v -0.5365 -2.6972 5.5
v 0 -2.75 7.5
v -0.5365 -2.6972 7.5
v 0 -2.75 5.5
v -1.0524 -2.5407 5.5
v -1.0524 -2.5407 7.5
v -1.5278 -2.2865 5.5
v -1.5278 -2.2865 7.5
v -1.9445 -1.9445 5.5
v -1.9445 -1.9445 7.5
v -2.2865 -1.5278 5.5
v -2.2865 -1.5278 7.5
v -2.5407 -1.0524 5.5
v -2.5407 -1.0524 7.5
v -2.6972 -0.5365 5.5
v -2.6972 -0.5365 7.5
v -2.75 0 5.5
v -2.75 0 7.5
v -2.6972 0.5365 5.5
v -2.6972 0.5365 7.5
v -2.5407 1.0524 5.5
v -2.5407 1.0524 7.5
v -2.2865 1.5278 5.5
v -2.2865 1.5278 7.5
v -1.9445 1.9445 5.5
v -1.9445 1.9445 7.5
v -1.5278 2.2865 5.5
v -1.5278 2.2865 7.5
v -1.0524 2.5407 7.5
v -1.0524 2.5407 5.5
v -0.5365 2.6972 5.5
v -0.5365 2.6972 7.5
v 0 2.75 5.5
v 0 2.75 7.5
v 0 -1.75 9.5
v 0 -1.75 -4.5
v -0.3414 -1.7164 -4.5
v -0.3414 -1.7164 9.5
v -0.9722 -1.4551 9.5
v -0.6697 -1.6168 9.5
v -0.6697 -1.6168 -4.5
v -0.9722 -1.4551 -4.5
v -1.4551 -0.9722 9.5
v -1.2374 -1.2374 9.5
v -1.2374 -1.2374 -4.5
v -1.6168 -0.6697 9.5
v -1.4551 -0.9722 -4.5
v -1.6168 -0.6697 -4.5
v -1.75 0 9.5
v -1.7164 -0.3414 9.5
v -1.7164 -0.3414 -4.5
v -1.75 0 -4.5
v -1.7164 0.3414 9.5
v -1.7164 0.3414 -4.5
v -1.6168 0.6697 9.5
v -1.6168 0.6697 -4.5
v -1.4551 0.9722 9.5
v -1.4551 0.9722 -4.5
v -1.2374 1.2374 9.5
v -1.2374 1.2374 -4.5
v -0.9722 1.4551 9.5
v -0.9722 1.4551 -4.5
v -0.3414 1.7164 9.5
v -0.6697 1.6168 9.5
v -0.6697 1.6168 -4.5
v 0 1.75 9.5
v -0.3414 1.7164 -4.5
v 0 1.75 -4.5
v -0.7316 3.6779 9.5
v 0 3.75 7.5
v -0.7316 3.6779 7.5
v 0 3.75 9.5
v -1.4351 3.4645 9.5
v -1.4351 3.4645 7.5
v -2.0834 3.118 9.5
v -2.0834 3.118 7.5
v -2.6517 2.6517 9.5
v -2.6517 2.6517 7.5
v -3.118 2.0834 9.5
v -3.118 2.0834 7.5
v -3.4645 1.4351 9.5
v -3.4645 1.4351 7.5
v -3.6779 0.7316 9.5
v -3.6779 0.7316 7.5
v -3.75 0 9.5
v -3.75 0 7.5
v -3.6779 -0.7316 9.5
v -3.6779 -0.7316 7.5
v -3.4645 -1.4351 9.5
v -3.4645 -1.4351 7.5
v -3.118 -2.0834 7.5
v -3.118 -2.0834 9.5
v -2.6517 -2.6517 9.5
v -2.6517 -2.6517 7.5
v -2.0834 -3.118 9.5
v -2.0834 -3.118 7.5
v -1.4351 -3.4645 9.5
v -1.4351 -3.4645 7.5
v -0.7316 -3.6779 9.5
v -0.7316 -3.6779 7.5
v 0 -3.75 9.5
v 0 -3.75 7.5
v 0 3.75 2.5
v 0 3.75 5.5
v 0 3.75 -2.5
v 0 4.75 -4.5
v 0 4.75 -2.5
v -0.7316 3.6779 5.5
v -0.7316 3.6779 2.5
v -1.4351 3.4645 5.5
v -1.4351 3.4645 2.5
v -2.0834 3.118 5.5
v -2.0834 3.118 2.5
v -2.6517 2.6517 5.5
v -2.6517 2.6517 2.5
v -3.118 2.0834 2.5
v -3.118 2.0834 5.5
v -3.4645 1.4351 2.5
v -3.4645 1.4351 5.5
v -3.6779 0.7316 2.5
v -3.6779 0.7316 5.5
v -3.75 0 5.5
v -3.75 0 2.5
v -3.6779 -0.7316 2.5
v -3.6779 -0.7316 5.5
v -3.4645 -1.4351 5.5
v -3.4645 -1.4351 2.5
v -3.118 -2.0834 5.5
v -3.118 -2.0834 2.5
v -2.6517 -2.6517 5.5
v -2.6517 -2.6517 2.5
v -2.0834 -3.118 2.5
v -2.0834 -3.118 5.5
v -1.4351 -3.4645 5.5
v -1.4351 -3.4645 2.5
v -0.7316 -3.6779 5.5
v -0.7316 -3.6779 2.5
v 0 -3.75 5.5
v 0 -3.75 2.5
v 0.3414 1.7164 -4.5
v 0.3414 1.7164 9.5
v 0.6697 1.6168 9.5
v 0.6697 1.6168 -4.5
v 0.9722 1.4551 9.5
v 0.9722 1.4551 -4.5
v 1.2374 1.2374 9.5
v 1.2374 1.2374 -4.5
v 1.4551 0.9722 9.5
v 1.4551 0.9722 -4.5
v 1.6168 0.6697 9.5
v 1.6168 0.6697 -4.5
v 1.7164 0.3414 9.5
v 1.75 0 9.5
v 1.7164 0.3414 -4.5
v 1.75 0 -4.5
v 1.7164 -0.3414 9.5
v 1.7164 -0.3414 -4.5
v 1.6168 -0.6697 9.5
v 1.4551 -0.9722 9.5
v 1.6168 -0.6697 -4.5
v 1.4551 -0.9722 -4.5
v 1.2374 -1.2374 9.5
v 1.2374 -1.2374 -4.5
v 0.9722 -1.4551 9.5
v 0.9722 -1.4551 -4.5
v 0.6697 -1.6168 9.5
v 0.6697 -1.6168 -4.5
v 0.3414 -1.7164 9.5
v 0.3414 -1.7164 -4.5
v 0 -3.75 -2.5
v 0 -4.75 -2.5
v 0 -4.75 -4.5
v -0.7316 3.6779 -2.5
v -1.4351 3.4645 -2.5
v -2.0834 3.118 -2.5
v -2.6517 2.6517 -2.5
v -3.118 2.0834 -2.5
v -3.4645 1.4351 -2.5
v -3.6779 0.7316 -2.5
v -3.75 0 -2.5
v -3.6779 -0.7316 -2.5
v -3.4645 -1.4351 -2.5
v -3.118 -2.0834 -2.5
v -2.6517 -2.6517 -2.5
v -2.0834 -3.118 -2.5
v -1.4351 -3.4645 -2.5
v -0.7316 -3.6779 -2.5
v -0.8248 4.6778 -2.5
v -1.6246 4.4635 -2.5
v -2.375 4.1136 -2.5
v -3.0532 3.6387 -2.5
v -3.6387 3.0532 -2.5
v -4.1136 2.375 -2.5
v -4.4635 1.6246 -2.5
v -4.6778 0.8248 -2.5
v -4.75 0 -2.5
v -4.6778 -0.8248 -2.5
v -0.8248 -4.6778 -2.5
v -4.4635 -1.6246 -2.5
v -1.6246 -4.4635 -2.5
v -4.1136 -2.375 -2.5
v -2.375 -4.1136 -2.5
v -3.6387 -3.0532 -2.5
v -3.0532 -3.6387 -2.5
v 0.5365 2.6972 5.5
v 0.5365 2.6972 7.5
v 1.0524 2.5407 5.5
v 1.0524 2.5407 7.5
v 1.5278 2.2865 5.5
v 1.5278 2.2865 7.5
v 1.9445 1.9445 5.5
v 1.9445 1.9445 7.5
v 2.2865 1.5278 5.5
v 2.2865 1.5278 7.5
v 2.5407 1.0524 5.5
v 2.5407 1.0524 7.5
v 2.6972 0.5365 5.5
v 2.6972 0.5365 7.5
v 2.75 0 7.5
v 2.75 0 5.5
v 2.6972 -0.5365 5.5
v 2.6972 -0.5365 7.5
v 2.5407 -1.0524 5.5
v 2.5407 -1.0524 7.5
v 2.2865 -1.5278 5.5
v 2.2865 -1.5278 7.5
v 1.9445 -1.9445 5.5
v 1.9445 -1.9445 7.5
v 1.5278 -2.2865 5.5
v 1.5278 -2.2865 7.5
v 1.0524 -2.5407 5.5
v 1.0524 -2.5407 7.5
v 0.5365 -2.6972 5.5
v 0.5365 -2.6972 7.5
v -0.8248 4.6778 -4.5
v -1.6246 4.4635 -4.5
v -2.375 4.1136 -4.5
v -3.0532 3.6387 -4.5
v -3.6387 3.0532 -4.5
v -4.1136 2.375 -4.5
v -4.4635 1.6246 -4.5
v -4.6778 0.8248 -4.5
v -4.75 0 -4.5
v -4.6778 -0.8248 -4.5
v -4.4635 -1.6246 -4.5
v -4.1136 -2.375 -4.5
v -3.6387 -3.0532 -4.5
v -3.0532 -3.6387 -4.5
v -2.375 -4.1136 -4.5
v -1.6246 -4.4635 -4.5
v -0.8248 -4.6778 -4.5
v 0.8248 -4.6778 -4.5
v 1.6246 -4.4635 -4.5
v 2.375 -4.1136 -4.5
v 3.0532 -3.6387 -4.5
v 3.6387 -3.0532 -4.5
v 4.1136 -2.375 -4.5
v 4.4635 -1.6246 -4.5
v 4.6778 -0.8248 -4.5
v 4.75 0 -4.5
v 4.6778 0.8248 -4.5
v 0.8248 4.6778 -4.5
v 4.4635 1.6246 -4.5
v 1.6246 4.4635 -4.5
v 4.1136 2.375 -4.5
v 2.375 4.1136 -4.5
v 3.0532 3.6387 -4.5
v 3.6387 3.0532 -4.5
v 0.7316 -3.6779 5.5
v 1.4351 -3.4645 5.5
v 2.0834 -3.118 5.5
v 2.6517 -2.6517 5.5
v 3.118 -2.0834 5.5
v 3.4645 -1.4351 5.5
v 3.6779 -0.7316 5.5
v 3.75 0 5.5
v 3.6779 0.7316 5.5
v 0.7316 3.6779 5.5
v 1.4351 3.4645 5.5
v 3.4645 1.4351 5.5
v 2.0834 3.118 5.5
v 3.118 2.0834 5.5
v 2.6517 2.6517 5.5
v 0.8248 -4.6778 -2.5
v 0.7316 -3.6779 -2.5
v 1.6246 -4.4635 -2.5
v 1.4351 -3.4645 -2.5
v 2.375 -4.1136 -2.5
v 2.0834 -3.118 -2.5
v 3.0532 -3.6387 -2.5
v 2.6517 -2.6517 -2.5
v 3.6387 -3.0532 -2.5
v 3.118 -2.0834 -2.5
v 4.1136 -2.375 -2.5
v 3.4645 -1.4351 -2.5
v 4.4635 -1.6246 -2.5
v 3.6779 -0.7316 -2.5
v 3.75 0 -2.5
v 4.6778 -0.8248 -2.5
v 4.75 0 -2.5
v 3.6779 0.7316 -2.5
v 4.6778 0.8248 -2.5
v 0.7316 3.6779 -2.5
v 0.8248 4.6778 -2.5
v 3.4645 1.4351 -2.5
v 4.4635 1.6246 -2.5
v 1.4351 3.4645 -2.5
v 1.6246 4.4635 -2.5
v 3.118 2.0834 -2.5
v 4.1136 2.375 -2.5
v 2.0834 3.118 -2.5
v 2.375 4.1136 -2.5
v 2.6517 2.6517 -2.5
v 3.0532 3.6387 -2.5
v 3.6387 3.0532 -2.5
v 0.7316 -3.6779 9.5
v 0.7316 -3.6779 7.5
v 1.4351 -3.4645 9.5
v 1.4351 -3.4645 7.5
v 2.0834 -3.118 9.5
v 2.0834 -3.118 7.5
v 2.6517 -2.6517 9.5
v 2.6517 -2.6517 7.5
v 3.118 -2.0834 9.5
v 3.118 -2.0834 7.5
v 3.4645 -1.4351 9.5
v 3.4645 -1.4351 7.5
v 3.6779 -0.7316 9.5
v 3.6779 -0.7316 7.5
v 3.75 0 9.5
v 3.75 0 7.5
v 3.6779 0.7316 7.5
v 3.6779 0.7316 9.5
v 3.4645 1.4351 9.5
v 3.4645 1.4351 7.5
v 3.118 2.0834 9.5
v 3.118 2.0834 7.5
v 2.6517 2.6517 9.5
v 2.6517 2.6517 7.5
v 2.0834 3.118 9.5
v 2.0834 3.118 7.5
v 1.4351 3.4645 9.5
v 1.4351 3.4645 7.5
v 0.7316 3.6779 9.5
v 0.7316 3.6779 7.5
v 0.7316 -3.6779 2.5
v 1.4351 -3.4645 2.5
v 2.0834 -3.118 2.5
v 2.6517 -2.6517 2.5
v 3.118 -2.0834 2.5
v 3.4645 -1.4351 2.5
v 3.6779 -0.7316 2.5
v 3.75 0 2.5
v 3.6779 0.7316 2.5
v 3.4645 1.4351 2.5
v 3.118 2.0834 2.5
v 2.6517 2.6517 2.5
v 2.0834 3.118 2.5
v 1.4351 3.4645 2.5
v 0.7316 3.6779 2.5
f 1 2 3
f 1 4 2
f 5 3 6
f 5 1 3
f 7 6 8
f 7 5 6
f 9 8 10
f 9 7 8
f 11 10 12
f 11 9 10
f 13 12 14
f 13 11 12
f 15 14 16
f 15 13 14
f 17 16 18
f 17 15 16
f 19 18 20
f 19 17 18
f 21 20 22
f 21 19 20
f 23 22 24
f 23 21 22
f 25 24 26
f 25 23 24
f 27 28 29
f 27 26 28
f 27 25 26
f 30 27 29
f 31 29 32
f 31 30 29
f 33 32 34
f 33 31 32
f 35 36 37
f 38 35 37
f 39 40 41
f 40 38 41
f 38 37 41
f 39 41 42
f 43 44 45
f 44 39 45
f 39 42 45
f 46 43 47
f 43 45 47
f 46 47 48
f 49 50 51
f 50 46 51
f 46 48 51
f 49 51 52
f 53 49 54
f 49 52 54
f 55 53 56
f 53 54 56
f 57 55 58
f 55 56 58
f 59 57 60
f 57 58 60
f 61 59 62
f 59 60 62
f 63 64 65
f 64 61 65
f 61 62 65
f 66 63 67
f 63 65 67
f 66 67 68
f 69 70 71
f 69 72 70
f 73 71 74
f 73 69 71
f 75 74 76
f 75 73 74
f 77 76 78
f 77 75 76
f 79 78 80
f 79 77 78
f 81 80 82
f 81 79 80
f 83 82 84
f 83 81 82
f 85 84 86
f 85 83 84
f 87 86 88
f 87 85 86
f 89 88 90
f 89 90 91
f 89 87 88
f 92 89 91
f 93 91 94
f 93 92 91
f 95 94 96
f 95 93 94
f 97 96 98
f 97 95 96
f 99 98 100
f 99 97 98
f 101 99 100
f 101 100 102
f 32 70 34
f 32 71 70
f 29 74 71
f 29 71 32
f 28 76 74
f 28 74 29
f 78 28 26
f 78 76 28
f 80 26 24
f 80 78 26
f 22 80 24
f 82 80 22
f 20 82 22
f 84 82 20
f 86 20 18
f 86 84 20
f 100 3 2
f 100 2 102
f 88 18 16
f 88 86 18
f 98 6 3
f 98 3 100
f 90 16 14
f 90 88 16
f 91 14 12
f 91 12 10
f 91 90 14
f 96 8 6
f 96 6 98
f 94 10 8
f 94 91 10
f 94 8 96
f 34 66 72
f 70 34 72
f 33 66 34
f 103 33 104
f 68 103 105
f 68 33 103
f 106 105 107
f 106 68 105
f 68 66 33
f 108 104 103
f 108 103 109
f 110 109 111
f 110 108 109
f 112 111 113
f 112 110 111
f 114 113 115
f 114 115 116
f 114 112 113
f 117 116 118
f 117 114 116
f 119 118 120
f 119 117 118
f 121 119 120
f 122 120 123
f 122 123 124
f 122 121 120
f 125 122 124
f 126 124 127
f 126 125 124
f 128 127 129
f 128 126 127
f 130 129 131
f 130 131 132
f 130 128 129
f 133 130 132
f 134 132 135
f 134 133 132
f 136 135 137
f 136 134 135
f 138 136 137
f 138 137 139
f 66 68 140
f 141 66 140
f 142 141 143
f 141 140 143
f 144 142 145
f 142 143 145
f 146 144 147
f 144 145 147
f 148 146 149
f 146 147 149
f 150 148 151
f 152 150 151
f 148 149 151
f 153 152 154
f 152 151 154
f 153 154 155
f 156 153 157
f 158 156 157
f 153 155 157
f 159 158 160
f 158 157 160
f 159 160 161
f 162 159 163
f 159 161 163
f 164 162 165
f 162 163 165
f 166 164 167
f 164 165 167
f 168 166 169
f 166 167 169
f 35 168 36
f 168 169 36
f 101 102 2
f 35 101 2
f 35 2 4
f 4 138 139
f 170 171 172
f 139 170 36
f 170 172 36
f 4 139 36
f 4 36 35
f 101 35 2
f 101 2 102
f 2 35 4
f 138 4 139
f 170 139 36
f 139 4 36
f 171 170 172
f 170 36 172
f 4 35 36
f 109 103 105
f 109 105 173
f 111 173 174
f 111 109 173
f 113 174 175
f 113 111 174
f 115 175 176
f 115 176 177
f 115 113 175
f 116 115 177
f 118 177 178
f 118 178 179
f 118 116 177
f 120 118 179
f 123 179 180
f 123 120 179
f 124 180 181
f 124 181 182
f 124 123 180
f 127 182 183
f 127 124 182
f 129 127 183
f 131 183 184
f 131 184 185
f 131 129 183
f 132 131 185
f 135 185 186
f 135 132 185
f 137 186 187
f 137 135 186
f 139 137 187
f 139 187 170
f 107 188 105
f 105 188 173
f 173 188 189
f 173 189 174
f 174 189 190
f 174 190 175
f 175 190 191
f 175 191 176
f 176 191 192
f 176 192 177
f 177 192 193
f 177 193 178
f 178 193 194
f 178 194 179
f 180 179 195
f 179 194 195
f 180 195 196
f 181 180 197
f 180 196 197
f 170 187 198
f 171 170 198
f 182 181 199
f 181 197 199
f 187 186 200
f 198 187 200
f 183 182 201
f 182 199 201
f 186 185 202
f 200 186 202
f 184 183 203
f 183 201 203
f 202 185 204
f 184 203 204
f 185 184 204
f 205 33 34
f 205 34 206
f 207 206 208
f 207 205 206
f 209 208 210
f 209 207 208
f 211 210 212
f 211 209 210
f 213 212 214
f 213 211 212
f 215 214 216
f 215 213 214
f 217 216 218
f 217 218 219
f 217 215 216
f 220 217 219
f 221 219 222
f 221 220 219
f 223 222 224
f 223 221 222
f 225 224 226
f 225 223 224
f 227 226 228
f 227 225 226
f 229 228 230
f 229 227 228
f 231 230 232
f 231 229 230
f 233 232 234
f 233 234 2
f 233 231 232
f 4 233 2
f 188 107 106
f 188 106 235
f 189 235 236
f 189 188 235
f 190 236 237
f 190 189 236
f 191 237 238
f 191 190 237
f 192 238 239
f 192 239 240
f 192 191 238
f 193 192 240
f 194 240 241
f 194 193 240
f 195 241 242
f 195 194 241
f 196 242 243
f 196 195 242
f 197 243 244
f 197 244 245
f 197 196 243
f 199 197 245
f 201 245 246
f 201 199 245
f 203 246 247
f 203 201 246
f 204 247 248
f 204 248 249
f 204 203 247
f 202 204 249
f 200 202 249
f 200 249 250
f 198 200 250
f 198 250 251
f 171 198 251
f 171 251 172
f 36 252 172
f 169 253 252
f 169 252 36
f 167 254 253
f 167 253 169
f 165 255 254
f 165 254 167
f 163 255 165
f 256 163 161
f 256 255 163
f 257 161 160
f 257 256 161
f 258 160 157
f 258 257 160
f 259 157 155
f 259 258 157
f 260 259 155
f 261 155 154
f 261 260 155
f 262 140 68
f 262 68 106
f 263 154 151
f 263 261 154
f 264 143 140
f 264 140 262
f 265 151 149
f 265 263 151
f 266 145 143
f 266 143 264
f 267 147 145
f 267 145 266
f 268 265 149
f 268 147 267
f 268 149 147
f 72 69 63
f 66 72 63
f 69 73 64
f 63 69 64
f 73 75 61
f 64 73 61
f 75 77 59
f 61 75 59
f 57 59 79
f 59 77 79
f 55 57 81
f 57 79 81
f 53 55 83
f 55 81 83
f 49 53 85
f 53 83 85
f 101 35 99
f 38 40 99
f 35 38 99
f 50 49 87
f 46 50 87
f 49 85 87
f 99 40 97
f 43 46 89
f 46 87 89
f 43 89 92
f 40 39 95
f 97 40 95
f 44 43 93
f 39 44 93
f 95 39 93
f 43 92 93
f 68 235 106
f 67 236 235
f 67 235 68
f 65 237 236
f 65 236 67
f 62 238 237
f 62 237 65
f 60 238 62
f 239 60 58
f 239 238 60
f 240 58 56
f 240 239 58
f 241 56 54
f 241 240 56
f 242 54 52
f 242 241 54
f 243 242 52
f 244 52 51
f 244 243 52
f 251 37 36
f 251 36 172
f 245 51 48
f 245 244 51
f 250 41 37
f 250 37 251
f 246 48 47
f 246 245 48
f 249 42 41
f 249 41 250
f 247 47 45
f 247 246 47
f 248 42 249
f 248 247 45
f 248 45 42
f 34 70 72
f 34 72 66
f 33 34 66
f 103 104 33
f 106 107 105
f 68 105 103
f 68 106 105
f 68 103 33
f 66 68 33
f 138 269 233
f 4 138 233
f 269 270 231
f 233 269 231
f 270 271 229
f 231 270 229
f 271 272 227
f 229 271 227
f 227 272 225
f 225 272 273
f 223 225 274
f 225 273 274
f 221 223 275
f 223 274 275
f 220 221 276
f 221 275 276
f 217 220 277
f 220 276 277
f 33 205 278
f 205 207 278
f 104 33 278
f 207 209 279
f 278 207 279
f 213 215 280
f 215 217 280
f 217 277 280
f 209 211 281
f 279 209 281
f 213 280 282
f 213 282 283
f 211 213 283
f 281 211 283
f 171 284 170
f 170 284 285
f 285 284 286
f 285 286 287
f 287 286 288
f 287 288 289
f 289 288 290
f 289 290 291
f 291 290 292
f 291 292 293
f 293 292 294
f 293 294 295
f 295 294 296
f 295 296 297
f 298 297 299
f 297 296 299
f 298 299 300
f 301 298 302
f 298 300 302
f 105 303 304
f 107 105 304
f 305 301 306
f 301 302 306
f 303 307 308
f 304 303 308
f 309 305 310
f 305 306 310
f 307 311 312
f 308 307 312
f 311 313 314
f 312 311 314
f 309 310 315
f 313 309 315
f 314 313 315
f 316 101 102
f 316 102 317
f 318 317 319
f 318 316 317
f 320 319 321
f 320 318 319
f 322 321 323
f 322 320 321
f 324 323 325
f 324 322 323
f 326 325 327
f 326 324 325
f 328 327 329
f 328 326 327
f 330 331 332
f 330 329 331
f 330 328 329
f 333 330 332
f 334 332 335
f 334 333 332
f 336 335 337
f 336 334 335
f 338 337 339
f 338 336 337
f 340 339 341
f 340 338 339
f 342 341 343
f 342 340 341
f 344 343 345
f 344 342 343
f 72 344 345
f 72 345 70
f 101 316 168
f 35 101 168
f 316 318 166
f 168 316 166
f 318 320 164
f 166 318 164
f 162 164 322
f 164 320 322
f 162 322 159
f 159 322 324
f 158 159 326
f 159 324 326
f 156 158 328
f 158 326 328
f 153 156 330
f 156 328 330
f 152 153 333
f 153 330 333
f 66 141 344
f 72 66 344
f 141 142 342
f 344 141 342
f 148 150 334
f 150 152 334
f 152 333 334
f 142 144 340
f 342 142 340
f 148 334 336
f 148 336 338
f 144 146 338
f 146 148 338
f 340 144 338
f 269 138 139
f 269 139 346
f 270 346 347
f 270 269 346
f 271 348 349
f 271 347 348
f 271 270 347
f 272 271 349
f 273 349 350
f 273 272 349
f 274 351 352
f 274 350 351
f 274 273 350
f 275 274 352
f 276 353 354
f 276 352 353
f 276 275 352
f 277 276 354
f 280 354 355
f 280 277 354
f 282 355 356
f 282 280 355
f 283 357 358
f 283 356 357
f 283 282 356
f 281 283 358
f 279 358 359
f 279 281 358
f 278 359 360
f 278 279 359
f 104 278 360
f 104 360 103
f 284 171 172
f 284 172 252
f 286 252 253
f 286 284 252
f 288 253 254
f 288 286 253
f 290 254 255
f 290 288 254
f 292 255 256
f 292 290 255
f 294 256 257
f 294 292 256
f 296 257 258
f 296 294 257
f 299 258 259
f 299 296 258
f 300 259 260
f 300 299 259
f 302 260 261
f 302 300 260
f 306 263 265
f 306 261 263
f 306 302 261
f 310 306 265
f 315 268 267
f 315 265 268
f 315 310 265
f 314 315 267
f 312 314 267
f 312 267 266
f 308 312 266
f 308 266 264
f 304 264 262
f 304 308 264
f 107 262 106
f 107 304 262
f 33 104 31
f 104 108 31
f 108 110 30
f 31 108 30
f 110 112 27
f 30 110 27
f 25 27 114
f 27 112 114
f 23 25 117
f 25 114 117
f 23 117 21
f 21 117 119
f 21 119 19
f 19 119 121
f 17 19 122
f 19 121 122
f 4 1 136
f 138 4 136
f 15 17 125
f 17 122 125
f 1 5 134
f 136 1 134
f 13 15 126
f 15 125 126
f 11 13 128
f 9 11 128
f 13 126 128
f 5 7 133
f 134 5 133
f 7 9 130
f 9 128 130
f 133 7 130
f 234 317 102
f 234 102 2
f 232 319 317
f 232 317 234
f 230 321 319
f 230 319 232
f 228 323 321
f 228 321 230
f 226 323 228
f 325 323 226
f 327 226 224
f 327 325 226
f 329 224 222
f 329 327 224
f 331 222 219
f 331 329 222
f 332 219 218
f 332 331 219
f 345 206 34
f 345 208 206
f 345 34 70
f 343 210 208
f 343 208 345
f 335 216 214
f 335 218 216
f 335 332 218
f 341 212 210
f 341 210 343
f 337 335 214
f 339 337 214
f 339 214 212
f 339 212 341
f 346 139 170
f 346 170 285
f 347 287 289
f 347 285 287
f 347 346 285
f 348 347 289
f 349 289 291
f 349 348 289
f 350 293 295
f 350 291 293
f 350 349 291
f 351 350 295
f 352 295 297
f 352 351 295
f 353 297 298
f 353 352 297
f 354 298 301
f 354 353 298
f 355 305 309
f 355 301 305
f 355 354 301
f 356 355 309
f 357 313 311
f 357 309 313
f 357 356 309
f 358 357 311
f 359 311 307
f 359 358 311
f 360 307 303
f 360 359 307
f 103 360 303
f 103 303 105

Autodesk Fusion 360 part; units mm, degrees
sketch "Skizze1" plane through (0, 0, 0) normal (0, 1, 0) x (1, 0, 0)
  line L0 (0, -75) -> (0, 75)
  line L1 (3.75, -2.5) -> (-50.75, -2.5) construction
  line L2 (-50.75, -2.5) -> (-50.75, 2.5) construction
  line L3 (-50.75, 2.5) -> (49.25, 2.5) construction
  line L4 (49.25, 2.5) -> (49.25, -2.5) construction
  line L5 (1.75, 4.5) -> (4.75, 4.5)
  line L6 (4.75, 4.5) -> (4.75, 2.5)
  line L7 (3.75, 2.5) -> (3.75, -2.5)
  line L8 (3.75, -5.5) -> (2.75, -5.5)
  line L9 (2.75, -7.5) -> (3.75, -7.5)
  line L10 (3.75, -7.5) -> (3.75, -9.5)
  line L11 (3.75, -9.5) -> (1.75, -9.5)
  line L12 (1.75, -9.5) -> (1.75, 4.5)
  line L13 (49.25, -2.5) -> (3.75, -2.5) construction
  line L14 (3.75, -2.5) -> (3.75, -5.5)
  line L15 (3.75, 2.5) -> (4.75, 2.5)
  line L16 (2.75, -7.5) -> (2.75, -5.5)
  dimension "d1" = 100
  dimension "d2" = 5
  dimension "d3" = 2
  dimension "d4" = 2
  dimension "d5" = 3
  dimension "d6" = 2
  dimension "d7" = 1
  dimension "d8" = 3
  dimension "d9" = 5
  dimension "d10" = 2
  dimension "d11" = 7.5
  dimension "d12" = 1
revolve "Drehen1" add sketch "Skizze1" angle 90 about axis through (0, 0, 75) along (0, 0, -1) second angle 90 makes body 1
mirror "Spiegeln1" about plane through (0, 0, 0) normal (1, 0, 0) of bodies 1 makes body 2
